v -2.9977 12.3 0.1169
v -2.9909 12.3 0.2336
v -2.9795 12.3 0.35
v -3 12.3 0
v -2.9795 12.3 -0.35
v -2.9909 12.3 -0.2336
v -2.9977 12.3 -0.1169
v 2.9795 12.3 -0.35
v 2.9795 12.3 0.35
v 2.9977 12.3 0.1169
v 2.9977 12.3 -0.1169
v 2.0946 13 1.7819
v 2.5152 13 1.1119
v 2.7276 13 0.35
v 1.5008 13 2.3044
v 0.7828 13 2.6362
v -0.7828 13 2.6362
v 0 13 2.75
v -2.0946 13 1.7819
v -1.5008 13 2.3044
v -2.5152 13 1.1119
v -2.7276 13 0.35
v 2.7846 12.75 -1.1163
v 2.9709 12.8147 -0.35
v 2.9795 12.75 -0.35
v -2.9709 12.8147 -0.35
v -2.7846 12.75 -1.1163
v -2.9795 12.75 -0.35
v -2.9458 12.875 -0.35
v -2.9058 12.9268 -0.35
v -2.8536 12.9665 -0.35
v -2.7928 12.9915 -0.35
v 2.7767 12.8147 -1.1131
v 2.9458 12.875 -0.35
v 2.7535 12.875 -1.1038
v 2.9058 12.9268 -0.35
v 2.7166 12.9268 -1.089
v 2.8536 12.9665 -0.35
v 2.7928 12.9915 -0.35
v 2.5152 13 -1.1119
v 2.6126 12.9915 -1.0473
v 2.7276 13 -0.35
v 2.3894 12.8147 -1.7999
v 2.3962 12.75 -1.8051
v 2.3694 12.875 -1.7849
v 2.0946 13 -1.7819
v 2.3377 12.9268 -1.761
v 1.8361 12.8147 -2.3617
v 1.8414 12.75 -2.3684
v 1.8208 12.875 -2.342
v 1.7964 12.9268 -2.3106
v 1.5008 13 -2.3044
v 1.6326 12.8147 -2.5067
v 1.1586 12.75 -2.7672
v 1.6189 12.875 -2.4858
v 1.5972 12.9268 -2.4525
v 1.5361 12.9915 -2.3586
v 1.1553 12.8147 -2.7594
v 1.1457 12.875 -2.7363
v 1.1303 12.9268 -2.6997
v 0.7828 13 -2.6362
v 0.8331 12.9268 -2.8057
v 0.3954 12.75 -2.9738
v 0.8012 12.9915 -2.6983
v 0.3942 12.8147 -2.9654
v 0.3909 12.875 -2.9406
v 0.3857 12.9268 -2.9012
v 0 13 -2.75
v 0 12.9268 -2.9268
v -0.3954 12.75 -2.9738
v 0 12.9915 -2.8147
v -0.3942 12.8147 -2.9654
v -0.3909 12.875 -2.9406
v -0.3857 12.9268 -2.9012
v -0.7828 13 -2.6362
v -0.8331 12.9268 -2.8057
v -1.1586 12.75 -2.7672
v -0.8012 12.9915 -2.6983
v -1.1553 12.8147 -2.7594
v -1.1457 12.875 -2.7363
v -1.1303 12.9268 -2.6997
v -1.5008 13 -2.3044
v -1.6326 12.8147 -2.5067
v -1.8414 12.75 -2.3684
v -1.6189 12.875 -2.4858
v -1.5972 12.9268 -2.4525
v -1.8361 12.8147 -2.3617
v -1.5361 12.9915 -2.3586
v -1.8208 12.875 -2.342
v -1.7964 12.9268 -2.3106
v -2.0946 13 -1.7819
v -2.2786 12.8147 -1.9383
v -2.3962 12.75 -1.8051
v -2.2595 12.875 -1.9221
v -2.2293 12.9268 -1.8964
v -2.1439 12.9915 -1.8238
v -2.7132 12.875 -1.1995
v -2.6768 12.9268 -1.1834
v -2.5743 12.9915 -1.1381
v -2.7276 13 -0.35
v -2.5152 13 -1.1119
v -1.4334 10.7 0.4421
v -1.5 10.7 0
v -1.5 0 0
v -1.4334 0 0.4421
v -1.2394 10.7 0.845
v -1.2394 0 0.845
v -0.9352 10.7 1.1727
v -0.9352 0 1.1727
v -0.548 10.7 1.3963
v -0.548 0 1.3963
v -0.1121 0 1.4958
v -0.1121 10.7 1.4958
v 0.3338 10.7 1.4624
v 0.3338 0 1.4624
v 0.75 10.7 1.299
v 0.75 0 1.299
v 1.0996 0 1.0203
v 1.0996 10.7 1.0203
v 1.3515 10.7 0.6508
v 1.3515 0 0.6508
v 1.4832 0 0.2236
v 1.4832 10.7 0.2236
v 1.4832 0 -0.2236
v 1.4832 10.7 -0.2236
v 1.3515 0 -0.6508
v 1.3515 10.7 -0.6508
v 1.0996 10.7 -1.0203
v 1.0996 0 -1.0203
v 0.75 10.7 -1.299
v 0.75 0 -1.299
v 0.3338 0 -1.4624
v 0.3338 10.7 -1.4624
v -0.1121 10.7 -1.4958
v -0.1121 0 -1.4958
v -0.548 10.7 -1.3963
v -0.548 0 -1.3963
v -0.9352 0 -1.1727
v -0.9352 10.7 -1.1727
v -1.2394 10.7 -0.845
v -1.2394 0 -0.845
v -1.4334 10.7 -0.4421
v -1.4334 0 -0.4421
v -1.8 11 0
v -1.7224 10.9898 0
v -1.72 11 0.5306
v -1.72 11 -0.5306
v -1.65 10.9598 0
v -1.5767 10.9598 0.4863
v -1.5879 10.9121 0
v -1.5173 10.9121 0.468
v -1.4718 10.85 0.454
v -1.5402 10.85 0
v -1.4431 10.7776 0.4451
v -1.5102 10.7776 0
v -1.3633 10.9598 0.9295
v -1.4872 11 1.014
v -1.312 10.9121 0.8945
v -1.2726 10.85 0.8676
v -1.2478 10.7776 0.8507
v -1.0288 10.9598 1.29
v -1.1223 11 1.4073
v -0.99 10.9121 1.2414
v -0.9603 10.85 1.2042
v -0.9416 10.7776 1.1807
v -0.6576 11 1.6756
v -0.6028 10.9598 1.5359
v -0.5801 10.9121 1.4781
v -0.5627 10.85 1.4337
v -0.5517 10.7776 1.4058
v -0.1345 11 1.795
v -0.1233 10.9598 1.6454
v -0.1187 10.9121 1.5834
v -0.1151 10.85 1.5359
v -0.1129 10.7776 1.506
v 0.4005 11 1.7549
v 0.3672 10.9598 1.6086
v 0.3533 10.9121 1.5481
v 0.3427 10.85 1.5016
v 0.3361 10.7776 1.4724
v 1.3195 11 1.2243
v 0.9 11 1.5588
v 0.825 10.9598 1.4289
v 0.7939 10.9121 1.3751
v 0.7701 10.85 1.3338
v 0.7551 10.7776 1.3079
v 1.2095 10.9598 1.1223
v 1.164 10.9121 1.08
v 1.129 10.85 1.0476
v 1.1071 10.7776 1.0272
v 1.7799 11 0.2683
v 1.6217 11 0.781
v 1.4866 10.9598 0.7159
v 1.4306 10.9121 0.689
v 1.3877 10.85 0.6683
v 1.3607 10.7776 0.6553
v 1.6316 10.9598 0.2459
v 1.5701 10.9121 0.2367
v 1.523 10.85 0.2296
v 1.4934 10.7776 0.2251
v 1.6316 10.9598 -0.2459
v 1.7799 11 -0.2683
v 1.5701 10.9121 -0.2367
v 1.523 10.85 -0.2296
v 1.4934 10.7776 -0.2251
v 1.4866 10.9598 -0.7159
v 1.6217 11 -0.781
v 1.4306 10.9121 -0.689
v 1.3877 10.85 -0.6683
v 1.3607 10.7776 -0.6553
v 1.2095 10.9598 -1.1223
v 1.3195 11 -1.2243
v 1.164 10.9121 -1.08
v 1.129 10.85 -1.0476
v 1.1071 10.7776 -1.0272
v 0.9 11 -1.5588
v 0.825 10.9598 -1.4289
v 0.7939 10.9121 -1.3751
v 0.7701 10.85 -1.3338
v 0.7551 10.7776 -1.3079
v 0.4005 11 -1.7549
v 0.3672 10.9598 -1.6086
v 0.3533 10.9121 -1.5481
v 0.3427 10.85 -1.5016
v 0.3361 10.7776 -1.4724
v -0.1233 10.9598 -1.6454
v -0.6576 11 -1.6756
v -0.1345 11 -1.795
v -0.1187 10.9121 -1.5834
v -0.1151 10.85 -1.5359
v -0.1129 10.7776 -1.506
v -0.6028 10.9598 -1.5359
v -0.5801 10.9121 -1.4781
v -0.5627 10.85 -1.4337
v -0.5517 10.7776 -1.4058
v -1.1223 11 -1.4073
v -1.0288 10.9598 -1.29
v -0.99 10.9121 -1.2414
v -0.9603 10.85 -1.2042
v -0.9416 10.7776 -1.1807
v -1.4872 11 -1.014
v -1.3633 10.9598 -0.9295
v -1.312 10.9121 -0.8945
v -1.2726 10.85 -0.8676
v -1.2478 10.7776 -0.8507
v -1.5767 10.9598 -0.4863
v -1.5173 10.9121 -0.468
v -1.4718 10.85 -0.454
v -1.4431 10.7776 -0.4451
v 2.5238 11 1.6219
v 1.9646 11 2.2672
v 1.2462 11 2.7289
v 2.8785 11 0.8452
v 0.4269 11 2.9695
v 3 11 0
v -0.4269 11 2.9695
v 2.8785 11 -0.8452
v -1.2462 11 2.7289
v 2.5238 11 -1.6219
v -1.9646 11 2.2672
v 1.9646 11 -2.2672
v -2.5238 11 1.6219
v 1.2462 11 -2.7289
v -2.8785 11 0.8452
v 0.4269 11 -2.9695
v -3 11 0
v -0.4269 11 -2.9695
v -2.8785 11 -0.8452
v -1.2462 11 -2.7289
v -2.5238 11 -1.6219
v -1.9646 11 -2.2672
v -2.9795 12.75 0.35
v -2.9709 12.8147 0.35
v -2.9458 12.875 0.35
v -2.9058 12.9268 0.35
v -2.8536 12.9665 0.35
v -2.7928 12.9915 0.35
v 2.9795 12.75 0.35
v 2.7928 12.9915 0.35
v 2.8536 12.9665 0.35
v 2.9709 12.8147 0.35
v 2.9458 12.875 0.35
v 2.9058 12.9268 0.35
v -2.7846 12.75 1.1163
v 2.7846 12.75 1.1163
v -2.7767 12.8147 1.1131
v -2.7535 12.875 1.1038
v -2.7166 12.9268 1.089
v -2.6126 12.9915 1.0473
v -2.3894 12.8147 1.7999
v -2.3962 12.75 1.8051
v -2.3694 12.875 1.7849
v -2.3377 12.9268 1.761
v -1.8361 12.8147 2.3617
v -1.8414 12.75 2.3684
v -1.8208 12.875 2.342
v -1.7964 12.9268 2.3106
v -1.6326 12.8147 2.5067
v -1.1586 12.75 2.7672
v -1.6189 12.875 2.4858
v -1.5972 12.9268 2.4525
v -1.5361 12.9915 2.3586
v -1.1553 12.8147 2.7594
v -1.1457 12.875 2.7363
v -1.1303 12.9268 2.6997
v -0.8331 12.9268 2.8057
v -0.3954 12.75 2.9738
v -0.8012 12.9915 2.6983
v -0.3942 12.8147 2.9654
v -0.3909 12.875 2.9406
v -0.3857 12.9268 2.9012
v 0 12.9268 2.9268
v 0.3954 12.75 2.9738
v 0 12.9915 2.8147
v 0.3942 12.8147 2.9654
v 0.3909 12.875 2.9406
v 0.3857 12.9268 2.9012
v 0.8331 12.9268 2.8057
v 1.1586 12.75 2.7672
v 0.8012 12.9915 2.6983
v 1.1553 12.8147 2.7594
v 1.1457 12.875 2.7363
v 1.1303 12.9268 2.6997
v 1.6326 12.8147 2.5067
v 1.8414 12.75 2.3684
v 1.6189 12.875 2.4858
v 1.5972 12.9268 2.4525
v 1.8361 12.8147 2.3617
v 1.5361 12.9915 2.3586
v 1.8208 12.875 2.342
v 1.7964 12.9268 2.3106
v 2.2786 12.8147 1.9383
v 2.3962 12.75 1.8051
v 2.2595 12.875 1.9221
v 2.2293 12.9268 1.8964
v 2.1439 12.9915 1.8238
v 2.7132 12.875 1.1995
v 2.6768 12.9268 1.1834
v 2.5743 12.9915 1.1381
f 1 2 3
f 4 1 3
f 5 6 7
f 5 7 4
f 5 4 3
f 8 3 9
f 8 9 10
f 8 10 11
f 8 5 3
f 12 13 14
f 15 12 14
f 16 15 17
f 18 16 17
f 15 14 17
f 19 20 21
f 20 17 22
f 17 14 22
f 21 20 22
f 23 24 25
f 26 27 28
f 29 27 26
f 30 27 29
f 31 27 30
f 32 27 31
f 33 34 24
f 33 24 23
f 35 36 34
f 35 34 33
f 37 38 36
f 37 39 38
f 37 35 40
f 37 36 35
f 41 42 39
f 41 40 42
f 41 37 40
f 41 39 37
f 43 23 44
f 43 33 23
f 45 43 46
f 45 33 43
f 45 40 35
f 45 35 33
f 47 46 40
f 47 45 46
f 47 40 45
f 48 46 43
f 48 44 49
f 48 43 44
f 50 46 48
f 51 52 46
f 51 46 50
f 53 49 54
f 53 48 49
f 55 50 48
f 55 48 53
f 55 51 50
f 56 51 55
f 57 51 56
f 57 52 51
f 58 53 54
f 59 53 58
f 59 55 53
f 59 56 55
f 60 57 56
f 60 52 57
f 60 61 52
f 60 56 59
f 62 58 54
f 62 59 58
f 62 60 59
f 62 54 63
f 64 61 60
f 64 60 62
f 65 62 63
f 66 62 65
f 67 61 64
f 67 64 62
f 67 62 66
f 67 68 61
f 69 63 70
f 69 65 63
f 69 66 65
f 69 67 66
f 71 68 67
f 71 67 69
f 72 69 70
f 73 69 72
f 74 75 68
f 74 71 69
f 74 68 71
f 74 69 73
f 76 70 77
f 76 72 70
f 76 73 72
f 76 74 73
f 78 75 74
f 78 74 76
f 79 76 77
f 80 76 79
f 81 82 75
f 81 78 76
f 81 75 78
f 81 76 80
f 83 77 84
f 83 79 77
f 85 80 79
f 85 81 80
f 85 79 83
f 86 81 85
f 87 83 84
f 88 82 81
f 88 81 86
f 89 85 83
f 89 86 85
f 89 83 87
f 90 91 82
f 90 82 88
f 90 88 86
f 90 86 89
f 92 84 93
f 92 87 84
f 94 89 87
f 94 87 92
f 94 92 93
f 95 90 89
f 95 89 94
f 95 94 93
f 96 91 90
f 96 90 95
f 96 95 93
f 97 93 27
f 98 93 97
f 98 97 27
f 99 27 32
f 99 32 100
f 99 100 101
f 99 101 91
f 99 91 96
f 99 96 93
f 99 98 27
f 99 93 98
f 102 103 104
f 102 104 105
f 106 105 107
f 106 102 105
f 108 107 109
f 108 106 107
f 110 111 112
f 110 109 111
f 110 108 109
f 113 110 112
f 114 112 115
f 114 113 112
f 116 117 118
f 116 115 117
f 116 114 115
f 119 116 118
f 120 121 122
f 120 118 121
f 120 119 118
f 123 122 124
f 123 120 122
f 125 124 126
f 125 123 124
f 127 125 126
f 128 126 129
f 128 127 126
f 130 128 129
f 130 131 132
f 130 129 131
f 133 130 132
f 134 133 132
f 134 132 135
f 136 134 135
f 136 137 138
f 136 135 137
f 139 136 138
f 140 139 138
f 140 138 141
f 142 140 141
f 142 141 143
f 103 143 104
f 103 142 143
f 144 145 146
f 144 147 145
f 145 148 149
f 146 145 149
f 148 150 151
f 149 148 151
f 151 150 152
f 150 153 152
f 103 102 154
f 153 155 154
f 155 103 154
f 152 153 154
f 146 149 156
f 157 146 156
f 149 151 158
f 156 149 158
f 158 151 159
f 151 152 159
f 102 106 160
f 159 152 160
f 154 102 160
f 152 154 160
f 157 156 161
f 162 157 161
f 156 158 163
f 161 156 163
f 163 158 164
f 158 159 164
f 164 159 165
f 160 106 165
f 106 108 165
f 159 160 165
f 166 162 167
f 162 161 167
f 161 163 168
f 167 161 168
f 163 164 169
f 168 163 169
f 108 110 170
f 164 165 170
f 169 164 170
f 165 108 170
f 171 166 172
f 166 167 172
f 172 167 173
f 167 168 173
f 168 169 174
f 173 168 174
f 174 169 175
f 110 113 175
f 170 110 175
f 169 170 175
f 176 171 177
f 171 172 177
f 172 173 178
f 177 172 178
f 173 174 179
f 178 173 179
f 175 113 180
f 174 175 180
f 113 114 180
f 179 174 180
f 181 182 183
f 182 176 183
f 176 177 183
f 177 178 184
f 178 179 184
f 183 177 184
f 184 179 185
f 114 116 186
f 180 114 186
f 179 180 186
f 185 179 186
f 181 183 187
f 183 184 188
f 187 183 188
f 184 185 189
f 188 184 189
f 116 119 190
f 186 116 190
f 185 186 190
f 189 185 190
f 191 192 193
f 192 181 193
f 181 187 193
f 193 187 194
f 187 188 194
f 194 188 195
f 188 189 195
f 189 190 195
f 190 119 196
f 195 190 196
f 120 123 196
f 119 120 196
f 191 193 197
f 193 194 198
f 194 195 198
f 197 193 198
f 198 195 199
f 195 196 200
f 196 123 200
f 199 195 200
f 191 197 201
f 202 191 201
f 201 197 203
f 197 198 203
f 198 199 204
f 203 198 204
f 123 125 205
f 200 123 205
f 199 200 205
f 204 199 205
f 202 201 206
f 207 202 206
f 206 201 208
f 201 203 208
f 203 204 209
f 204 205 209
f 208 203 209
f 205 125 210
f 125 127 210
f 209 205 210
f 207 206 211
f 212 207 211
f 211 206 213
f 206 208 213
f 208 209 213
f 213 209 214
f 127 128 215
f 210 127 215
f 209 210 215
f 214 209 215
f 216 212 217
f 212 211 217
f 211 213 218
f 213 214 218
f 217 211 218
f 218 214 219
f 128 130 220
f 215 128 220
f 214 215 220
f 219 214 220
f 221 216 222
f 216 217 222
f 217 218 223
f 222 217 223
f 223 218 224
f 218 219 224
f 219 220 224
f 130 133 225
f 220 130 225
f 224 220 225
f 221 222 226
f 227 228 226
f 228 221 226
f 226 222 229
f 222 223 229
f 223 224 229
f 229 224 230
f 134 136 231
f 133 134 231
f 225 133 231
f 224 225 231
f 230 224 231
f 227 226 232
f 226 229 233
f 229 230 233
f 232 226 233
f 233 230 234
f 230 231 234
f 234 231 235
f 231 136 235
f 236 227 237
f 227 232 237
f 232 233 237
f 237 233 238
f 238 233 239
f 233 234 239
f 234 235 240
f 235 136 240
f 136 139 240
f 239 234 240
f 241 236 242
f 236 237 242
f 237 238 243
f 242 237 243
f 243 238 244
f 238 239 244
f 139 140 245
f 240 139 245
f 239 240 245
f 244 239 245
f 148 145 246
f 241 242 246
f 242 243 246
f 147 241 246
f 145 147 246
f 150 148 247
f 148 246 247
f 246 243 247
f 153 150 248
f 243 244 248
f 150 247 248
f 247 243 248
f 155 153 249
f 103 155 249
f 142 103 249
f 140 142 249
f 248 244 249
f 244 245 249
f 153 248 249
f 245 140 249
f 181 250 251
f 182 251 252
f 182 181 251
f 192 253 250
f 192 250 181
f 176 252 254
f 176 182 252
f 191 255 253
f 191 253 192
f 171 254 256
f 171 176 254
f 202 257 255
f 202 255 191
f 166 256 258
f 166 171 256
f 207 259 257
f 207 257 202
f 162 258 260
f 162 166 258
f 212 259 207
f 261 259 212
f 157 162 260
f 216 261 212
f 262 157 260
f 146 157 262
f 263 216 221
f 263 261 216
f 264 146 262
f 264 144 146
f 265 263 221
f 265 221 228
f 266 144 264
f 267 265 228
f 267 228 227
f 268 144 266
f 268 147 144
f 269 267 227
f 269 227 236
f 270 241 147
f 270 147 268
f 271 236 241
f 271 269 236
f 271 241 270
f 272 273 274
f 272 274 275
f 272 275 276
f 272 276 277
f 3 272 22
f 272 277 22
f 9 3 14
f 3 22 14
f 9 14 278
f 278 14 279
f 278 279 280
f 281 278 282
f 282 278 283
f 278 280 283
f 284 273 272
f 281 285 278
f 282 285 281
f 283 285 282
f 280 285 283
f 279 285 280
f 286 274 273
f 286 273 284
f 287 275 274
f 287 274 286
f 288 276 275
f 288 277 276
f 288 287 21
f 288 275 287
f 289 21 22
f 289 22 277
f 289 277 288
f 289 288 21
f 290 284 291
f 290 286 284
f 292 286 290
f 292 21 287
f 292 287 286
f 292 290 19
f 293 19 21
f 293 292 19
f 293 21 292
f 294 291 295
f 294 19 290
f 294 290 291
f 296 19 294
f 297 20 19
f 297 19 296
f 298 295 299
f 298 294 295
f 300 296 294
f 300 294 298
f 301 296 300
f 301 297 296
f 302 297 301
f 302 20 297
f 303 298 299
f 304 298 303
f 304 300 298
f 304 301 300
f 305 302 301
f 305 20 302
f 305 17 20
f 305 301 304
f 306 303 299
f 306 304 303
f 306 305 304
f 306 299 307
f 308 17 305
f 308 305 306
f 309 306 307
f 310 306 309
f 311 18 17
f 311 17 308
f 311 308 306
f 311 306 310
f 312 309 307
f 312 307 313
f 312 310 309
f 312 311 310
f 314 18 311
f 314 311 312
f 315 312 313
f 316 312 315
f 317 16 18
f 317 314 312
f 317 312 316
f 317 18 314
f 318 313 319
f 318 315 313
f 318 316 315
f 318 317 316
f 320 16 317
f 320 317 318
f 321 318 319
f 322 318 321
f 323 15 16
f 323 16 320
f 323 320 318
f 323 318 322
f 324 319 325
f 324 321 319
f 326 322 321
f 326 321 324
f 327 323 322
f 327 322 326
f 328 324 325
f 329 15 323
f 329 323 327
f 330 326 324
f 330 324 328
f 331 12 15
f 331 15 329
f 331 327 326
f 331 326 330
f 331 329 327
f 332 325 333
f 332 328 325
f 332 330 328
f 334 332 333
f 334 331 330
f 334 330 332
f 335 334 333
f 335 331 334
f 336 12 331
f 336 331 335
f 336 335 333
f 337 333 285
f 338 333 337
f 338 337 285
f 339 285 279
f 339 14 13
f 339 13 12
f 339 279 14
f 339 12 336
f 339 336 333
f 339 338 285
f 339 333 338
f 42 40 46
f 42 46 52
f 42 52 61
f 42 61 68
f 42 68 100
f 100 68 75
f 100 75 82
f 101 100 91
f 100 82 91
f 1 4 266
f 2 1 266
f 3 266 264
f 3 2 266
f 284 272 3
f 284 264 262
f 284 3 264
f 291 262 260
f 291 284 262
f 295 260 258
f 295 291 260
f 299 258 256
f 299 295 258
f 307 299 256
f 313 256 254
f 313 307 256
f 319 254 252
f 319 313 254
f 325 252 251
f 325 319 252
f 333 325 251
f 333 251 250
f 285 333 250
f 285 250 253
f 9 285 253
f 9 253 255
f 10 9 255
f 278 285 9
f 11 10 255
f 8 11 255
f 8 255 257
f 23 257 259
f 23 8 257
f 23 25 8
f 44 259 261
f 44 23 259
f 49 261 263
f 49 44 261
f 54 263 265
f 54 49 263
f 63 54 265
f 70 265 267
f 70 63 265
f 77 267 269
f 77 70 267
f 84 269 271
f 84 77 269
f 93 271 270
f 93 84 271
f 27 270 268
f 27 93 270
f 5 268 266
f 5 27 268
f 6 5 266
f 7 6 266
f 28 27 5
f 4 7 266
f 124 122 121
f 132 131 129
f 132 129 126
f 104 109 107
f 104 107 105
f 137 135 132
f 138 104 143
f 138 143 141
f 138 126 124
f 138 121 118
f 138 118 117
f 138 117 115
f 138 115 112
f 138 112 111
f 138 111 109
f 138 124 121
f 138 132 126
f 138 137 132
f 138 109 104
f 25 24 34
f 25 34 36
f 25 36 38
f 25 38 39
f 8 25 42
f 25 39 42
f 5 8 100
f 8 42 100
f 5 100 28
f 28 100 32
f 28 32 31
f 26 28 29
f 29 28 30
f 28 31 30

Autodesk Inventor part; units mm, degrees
ref_plane "YZ Plane" through (0, 0, 0) normal (1, 0, 0) x (0, 1, 0)
ref_plane "XZ Plane" through (0, 0, 0) normal (0, 1, 0) x (-1, 0, 0)
ref_plane "XY Plane" through (0, 0, 0) normal (0, 0, 1) x (1, 0, 0)
sketch "Sketch1" plane through (0, 0, 0) normal (0, 0, 1) x (1, 0, 0)
  line L0 (0, 0) -> (-1.5, 0)
  line L1 (-1.5, 0) -> (-1.5, 10)
  line L2 (-1.5, 10) -> (-1.5, 10)
  line L3 (-1.5, 10) -> (-1.5, 11)
  line L4 (-1.5, 11) -> (-3, 11)
  line L5 (-3, 11) -> (-3, 13)
  line L6 (-3, 13) -> (0, 13)
  line L7 (0, 13) -> (0, 0)
  dimension "d0" = 2
  dimension "d1" = 3
  dimension "d2" = 1.5
  dimension "d3" = 0
  dimension "d4" = 1
  dimension "d5" = 13
  dimension "d6" = 90
revolve "Revolution1" add sketch "Sketch1" angle 360 about axis through (0, 13, 0) along (0, -1, 0)
thread "Thread1" size "M3x0.35" class "6g" standard "ANSI Metric M Profile" length 27
sketch "Sketch2" plane through (0, 13, 0) normal (0, 1, 0) x (1, 0, 0)
  line L0 (5, 0.35) -> (-5, 0.35)
  line L1 (-5, 0.35) -> (-5, -0.35)
  line L2 (-5, -0.35) -> (5, -0.35)
  line L3 (5, -0.35) -> (5, 0.35)
  line L4 (5, 0.35) -> (-5, -0.35) construction
  line L5 (-5, 0.35) -> (5, -0.35) construction
  point P0 (0, 0)
  dimension "d10" = 10
  dimension "d11" = 0.7
fillet "Fillet1" radius 0.25 1 edges at (3, 13, 0)
extrude "Extrusion2" cut sketch "Sketch2" against normal blind 0.7
fillet "Fillet2" radius 0.3 1 edges at (1.5, 11, 0)
properties part number "TorsionOscillator-Screw-M3-Brass-CheeseHead-10mm-fine" material "Brass, Soft Yellow"
